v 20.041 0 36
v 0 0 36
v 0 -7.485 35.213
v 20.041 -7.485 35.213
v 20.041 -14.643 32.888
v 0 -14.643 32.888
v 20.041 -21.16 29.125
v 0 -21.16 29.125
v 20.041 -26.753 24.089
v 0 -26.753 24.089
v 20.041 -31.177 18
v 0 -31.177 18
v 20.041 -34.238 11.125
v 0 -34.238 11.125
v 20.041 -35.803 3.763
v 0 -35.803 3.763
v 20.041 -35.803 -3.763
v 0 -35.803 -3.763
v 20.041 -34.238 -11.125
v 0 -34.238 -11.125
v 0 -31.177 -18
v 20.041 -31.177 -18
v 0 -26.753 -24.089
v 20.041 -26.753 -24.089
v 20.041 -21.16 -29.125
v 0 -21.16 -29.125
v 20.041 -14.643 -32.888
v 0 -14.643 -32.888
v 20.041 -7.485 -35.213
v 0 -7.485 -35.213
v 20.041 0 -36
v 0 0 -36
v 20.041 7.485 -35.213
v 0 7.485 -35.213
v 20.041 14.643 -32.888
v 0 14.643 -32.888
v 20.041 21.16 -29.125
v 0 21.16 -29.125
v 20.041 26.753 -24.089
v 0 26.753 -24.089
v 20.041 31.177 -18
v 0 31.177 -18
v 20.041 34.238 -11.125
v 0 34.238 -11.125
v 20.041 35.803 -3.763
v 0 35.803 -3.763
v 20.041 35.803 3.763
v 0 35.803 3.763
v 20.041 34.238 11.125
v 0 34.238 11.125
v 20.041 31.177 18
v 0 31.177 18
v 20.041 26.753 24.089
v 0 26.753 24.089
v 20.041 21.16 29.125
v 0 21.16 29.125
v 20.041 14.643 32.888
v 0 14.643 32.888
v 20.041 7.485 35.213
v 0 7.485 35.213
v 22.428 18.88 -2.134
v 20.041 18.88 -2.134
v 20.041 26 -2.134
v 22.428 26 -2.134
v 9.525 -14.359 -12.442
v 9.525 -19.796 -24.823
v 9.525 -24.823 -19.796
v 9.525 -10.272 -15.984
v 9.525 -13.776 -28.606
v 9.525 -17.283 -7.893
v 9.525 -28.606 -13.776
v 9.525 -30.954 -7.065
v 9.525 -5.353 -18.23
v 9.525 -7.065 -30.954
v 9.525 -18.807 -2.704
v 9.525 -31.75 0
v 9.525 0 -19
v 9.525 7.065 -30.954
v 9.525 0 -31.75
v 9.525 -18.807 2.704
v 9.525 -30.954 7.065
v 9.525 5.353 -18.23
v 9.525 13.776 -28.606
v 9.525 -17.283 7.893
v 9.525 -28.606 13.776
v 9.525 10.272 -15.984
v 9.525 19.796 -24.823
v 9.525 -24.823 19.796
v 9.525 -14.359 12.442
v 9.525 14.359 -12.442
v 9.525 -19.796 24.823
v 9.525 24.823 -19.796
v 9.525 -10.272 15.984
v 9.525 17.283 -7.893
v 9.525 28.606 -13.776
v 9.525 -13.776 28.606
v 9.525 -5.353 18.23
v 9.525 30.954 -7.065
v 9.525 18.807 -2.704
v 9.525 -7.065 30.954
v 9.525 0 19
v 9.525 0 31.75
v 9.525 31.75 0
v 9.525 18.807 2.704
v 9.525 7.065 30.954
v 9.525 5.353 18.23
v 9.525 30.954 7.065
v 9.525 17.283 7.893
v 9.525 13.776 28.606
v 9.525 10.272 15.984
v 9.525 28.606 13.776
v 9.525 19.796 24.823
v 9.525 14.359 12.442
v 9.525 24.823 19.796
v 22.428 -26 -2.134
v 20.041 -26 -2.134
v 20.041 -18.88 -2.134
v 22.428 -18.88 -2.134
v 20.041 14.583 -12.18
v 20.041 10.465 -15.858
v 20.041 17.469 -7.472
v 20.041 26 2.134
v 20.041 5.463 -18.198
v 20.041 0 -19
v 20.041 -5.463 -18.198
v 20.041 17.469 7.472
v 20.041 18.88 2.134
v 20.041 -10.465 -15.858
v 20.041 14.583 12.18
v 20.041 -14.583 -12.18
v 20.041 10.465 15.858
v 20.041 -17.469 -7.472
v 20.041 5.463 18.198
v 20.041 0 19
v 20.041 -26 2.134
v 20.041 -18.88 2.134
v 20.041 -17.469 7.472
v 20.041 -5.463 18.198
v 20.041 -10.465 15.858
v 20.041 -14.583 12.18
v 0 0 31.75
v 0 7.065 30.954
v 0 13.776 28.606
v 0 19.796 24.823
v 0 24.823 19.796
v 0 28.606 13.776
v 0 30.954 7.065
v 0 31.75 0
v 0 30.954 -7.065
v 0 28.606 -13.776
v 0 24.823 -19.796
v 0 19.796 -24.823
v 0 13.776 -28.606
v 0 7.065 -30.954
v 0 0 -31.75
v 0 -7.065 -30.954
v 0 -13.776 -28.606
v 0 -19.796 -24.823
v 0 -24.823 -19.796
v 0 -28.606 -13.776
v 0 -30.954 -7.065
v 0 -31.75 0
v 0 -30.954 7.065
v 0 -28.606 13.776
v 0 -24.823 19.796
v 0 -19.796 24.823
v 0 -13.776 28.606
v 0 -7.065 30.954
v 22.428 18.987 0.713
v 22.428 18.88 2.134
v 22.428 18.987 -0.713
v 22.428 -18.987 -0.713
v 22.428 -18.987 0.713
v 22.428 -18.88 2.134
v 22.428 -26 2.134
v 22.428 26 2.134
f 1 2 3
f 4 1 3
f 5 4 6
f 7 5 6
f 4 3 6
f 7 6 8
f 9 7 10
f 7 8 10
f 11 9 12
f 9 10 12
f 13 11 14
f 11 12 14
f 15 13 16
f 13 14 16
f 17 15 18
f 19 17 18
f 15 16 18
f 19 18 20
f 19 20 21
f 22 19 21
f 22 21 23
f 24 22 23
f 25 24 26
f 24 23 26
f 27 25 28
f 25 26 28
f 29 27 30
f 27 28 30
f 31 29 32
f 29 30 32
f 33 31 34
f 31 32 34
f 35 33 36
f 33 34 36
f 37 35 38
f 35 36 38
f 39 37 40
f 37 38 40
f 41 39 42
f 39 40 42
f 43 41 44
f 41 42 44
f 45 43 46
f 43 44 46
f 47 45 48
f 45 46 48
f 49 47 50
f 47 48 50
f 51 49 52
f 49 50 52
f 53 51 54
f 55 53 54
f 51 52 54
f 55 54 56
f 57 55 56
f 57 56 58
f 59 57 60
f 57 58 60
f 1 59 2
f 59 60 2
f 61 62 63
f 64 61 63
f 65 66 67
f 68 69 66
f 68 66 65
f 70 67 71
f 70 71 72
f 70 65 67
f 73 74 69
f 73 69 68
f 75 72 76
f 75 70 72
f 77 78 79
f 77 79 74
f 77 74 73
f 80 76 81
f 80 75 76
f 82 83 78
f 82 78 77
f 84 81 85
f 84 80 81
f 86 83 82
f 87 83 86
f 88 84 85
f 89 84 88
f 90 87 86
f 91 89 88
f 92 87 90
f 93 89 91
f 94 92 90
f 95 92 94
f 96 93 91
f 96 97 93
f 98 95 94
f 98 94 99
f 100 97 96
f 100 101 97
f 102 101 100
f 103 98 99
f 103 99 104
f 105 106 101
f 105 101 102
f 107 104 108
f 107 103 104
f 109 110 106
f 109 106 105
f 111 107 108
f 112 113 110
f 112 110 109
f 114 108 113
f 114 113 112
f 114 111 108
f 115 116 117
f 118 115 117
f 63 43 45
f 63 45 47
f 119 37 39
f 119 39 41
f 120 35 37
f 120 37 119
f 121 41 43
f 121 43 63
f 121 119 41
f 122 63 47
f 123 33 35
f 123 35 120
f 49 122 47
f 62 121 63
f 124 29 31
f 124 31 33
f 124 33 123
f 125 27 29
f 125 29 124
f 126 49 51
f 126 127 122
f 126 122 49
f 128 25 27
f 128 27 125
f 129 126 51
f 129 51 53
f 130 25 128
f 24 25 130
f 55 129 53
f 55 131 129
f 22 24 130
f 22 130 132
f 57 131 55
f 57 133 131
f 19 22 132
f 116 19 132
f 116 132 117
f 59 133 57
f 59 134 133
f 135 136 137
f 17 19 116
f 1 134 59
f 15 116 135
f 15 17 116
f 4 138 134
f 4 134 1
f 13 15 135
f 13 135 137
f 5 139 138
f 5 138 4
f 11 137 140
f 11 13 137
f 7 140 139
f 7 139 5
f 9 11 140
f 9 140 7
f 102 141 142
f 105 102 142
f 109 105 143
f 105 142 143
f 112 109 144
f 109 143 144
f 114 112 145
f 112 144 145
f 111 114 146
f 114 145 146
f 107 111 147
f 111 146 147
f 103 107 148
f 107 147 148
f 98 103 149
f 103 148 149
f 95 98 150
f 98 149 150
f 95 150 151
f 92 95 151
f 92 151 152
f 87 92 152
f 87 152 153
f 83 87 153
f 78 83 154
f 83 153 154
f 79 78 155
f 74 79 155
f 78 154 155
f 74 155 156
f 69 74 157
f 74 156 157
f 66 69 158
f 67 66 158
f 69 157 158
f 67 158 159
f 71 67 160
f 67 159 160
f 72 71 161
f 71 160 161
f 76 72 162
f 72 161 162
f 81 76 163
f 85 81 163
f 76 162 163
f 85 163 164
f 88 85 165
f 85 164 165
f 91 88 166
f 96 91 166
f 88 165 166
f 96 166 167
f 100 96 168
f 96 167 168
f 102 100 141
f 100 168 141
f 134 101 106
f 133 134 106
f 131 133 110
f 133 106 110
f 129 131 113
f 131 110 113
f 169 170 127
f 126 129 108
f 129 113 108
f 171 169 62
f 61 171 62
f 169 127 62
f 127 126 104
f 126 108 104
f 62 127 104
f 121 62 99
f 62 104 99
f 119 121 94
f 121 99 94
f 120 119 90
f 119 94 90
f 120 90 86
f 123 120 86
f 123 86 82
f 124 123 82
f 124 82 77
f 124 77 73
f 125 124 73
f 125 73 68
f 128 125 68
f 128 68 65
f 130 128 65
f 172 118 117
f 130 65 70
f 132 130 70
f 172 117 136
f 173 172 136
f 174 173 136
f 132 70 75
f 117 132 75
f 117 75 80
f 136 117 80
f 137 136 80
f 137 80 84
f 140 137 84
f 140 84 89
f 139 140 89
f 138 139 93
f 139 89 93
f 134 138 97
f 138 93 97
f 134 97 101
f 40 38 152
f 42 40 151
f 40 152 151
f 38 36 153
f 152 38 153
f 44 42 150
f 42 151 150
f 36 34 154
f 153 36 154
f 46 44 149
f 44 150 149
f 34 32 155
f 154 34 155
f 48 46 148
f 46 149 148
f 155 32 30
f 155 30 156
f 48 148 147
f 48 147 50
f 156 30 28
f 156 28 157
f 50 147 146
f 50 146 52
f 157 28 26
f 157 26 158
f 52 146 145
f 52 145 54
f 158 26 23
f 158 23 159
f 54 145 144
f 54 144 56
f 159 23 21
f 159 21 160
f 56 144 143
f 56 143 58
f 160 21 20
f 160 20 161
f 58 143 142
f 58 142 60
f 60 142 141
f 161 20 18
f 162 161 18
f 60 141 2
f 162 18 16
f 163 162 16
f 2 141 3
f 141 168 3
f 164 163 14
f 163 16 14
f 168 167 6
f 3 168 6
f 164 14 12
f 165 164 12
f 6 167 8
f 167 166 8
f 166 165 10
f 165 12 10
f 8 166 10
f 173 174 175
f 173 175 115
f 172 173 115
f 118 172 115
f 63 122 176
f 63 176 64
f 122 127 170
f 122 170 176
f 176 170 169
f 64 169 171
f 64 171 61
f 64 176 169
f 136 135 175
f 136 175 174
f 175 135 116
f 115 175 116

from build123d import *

# Parameters (mm, degrees)
SKETCH13_R           = 36
BOSS_EXTRUDE11_DEPTH = 20.0406
SKETCH14_R           = 31.75
CUT_EXTRUDE2_DEPTH   = 9.525
SKETCH16_W           = 4.2672
SKETCH16_H           = 52
BOSS_EXTRUDE12_DEPTH = 2.3876
SKETCH15_R           = 19
CUT_EXTRUDE3_DEPTH   = 56.632941278


with BuildPart() as part:
    # Sketch13 → Boss-Extrude11 (new body)
    with BuildSketch(Plane(origin=(0, 0, 0), x_dir=(0, 0, -1), z_dir=(1, 0, 0))):
        with Locations(Location((0, 0, 0), (0, 0, 180))):
            Circle(SKETCH13_R)
    extrude(amount=BOSS_EXTRUDE11_DEPTH)

    # Sketch14 → Cut-Extrude2 (cut)
    with BuildSketch(Plane.ZY):
        Circle(SKETCH14_R)
    extrude(amount=-CUT_EXTRUDE2_DEPTH, mode=Mode.SUBTRACT)

    # Sketch16 → Boss-Extrude12 (add)
    with BuildSketch(Plane(origin=(20.0406, 0, 0), x_dir=(0, 0, -1), z_dir=(1, 0, 0))):
        Rectangle(SKETCH16_W, SKETCH16_H)
    extrude(amount=BOSS_EXTRUDE12_DEPTH)

    # Sketch15 → Cut-Extrude3 (cut, through all)
    with BuildSketch(Plane.ZY):
        Circle(SKETCH15_R)
    extrude(amount=-CUT_EXTRUDE3_DEPTH, mode=Mode.SUBTRACT)


solid = part.part
